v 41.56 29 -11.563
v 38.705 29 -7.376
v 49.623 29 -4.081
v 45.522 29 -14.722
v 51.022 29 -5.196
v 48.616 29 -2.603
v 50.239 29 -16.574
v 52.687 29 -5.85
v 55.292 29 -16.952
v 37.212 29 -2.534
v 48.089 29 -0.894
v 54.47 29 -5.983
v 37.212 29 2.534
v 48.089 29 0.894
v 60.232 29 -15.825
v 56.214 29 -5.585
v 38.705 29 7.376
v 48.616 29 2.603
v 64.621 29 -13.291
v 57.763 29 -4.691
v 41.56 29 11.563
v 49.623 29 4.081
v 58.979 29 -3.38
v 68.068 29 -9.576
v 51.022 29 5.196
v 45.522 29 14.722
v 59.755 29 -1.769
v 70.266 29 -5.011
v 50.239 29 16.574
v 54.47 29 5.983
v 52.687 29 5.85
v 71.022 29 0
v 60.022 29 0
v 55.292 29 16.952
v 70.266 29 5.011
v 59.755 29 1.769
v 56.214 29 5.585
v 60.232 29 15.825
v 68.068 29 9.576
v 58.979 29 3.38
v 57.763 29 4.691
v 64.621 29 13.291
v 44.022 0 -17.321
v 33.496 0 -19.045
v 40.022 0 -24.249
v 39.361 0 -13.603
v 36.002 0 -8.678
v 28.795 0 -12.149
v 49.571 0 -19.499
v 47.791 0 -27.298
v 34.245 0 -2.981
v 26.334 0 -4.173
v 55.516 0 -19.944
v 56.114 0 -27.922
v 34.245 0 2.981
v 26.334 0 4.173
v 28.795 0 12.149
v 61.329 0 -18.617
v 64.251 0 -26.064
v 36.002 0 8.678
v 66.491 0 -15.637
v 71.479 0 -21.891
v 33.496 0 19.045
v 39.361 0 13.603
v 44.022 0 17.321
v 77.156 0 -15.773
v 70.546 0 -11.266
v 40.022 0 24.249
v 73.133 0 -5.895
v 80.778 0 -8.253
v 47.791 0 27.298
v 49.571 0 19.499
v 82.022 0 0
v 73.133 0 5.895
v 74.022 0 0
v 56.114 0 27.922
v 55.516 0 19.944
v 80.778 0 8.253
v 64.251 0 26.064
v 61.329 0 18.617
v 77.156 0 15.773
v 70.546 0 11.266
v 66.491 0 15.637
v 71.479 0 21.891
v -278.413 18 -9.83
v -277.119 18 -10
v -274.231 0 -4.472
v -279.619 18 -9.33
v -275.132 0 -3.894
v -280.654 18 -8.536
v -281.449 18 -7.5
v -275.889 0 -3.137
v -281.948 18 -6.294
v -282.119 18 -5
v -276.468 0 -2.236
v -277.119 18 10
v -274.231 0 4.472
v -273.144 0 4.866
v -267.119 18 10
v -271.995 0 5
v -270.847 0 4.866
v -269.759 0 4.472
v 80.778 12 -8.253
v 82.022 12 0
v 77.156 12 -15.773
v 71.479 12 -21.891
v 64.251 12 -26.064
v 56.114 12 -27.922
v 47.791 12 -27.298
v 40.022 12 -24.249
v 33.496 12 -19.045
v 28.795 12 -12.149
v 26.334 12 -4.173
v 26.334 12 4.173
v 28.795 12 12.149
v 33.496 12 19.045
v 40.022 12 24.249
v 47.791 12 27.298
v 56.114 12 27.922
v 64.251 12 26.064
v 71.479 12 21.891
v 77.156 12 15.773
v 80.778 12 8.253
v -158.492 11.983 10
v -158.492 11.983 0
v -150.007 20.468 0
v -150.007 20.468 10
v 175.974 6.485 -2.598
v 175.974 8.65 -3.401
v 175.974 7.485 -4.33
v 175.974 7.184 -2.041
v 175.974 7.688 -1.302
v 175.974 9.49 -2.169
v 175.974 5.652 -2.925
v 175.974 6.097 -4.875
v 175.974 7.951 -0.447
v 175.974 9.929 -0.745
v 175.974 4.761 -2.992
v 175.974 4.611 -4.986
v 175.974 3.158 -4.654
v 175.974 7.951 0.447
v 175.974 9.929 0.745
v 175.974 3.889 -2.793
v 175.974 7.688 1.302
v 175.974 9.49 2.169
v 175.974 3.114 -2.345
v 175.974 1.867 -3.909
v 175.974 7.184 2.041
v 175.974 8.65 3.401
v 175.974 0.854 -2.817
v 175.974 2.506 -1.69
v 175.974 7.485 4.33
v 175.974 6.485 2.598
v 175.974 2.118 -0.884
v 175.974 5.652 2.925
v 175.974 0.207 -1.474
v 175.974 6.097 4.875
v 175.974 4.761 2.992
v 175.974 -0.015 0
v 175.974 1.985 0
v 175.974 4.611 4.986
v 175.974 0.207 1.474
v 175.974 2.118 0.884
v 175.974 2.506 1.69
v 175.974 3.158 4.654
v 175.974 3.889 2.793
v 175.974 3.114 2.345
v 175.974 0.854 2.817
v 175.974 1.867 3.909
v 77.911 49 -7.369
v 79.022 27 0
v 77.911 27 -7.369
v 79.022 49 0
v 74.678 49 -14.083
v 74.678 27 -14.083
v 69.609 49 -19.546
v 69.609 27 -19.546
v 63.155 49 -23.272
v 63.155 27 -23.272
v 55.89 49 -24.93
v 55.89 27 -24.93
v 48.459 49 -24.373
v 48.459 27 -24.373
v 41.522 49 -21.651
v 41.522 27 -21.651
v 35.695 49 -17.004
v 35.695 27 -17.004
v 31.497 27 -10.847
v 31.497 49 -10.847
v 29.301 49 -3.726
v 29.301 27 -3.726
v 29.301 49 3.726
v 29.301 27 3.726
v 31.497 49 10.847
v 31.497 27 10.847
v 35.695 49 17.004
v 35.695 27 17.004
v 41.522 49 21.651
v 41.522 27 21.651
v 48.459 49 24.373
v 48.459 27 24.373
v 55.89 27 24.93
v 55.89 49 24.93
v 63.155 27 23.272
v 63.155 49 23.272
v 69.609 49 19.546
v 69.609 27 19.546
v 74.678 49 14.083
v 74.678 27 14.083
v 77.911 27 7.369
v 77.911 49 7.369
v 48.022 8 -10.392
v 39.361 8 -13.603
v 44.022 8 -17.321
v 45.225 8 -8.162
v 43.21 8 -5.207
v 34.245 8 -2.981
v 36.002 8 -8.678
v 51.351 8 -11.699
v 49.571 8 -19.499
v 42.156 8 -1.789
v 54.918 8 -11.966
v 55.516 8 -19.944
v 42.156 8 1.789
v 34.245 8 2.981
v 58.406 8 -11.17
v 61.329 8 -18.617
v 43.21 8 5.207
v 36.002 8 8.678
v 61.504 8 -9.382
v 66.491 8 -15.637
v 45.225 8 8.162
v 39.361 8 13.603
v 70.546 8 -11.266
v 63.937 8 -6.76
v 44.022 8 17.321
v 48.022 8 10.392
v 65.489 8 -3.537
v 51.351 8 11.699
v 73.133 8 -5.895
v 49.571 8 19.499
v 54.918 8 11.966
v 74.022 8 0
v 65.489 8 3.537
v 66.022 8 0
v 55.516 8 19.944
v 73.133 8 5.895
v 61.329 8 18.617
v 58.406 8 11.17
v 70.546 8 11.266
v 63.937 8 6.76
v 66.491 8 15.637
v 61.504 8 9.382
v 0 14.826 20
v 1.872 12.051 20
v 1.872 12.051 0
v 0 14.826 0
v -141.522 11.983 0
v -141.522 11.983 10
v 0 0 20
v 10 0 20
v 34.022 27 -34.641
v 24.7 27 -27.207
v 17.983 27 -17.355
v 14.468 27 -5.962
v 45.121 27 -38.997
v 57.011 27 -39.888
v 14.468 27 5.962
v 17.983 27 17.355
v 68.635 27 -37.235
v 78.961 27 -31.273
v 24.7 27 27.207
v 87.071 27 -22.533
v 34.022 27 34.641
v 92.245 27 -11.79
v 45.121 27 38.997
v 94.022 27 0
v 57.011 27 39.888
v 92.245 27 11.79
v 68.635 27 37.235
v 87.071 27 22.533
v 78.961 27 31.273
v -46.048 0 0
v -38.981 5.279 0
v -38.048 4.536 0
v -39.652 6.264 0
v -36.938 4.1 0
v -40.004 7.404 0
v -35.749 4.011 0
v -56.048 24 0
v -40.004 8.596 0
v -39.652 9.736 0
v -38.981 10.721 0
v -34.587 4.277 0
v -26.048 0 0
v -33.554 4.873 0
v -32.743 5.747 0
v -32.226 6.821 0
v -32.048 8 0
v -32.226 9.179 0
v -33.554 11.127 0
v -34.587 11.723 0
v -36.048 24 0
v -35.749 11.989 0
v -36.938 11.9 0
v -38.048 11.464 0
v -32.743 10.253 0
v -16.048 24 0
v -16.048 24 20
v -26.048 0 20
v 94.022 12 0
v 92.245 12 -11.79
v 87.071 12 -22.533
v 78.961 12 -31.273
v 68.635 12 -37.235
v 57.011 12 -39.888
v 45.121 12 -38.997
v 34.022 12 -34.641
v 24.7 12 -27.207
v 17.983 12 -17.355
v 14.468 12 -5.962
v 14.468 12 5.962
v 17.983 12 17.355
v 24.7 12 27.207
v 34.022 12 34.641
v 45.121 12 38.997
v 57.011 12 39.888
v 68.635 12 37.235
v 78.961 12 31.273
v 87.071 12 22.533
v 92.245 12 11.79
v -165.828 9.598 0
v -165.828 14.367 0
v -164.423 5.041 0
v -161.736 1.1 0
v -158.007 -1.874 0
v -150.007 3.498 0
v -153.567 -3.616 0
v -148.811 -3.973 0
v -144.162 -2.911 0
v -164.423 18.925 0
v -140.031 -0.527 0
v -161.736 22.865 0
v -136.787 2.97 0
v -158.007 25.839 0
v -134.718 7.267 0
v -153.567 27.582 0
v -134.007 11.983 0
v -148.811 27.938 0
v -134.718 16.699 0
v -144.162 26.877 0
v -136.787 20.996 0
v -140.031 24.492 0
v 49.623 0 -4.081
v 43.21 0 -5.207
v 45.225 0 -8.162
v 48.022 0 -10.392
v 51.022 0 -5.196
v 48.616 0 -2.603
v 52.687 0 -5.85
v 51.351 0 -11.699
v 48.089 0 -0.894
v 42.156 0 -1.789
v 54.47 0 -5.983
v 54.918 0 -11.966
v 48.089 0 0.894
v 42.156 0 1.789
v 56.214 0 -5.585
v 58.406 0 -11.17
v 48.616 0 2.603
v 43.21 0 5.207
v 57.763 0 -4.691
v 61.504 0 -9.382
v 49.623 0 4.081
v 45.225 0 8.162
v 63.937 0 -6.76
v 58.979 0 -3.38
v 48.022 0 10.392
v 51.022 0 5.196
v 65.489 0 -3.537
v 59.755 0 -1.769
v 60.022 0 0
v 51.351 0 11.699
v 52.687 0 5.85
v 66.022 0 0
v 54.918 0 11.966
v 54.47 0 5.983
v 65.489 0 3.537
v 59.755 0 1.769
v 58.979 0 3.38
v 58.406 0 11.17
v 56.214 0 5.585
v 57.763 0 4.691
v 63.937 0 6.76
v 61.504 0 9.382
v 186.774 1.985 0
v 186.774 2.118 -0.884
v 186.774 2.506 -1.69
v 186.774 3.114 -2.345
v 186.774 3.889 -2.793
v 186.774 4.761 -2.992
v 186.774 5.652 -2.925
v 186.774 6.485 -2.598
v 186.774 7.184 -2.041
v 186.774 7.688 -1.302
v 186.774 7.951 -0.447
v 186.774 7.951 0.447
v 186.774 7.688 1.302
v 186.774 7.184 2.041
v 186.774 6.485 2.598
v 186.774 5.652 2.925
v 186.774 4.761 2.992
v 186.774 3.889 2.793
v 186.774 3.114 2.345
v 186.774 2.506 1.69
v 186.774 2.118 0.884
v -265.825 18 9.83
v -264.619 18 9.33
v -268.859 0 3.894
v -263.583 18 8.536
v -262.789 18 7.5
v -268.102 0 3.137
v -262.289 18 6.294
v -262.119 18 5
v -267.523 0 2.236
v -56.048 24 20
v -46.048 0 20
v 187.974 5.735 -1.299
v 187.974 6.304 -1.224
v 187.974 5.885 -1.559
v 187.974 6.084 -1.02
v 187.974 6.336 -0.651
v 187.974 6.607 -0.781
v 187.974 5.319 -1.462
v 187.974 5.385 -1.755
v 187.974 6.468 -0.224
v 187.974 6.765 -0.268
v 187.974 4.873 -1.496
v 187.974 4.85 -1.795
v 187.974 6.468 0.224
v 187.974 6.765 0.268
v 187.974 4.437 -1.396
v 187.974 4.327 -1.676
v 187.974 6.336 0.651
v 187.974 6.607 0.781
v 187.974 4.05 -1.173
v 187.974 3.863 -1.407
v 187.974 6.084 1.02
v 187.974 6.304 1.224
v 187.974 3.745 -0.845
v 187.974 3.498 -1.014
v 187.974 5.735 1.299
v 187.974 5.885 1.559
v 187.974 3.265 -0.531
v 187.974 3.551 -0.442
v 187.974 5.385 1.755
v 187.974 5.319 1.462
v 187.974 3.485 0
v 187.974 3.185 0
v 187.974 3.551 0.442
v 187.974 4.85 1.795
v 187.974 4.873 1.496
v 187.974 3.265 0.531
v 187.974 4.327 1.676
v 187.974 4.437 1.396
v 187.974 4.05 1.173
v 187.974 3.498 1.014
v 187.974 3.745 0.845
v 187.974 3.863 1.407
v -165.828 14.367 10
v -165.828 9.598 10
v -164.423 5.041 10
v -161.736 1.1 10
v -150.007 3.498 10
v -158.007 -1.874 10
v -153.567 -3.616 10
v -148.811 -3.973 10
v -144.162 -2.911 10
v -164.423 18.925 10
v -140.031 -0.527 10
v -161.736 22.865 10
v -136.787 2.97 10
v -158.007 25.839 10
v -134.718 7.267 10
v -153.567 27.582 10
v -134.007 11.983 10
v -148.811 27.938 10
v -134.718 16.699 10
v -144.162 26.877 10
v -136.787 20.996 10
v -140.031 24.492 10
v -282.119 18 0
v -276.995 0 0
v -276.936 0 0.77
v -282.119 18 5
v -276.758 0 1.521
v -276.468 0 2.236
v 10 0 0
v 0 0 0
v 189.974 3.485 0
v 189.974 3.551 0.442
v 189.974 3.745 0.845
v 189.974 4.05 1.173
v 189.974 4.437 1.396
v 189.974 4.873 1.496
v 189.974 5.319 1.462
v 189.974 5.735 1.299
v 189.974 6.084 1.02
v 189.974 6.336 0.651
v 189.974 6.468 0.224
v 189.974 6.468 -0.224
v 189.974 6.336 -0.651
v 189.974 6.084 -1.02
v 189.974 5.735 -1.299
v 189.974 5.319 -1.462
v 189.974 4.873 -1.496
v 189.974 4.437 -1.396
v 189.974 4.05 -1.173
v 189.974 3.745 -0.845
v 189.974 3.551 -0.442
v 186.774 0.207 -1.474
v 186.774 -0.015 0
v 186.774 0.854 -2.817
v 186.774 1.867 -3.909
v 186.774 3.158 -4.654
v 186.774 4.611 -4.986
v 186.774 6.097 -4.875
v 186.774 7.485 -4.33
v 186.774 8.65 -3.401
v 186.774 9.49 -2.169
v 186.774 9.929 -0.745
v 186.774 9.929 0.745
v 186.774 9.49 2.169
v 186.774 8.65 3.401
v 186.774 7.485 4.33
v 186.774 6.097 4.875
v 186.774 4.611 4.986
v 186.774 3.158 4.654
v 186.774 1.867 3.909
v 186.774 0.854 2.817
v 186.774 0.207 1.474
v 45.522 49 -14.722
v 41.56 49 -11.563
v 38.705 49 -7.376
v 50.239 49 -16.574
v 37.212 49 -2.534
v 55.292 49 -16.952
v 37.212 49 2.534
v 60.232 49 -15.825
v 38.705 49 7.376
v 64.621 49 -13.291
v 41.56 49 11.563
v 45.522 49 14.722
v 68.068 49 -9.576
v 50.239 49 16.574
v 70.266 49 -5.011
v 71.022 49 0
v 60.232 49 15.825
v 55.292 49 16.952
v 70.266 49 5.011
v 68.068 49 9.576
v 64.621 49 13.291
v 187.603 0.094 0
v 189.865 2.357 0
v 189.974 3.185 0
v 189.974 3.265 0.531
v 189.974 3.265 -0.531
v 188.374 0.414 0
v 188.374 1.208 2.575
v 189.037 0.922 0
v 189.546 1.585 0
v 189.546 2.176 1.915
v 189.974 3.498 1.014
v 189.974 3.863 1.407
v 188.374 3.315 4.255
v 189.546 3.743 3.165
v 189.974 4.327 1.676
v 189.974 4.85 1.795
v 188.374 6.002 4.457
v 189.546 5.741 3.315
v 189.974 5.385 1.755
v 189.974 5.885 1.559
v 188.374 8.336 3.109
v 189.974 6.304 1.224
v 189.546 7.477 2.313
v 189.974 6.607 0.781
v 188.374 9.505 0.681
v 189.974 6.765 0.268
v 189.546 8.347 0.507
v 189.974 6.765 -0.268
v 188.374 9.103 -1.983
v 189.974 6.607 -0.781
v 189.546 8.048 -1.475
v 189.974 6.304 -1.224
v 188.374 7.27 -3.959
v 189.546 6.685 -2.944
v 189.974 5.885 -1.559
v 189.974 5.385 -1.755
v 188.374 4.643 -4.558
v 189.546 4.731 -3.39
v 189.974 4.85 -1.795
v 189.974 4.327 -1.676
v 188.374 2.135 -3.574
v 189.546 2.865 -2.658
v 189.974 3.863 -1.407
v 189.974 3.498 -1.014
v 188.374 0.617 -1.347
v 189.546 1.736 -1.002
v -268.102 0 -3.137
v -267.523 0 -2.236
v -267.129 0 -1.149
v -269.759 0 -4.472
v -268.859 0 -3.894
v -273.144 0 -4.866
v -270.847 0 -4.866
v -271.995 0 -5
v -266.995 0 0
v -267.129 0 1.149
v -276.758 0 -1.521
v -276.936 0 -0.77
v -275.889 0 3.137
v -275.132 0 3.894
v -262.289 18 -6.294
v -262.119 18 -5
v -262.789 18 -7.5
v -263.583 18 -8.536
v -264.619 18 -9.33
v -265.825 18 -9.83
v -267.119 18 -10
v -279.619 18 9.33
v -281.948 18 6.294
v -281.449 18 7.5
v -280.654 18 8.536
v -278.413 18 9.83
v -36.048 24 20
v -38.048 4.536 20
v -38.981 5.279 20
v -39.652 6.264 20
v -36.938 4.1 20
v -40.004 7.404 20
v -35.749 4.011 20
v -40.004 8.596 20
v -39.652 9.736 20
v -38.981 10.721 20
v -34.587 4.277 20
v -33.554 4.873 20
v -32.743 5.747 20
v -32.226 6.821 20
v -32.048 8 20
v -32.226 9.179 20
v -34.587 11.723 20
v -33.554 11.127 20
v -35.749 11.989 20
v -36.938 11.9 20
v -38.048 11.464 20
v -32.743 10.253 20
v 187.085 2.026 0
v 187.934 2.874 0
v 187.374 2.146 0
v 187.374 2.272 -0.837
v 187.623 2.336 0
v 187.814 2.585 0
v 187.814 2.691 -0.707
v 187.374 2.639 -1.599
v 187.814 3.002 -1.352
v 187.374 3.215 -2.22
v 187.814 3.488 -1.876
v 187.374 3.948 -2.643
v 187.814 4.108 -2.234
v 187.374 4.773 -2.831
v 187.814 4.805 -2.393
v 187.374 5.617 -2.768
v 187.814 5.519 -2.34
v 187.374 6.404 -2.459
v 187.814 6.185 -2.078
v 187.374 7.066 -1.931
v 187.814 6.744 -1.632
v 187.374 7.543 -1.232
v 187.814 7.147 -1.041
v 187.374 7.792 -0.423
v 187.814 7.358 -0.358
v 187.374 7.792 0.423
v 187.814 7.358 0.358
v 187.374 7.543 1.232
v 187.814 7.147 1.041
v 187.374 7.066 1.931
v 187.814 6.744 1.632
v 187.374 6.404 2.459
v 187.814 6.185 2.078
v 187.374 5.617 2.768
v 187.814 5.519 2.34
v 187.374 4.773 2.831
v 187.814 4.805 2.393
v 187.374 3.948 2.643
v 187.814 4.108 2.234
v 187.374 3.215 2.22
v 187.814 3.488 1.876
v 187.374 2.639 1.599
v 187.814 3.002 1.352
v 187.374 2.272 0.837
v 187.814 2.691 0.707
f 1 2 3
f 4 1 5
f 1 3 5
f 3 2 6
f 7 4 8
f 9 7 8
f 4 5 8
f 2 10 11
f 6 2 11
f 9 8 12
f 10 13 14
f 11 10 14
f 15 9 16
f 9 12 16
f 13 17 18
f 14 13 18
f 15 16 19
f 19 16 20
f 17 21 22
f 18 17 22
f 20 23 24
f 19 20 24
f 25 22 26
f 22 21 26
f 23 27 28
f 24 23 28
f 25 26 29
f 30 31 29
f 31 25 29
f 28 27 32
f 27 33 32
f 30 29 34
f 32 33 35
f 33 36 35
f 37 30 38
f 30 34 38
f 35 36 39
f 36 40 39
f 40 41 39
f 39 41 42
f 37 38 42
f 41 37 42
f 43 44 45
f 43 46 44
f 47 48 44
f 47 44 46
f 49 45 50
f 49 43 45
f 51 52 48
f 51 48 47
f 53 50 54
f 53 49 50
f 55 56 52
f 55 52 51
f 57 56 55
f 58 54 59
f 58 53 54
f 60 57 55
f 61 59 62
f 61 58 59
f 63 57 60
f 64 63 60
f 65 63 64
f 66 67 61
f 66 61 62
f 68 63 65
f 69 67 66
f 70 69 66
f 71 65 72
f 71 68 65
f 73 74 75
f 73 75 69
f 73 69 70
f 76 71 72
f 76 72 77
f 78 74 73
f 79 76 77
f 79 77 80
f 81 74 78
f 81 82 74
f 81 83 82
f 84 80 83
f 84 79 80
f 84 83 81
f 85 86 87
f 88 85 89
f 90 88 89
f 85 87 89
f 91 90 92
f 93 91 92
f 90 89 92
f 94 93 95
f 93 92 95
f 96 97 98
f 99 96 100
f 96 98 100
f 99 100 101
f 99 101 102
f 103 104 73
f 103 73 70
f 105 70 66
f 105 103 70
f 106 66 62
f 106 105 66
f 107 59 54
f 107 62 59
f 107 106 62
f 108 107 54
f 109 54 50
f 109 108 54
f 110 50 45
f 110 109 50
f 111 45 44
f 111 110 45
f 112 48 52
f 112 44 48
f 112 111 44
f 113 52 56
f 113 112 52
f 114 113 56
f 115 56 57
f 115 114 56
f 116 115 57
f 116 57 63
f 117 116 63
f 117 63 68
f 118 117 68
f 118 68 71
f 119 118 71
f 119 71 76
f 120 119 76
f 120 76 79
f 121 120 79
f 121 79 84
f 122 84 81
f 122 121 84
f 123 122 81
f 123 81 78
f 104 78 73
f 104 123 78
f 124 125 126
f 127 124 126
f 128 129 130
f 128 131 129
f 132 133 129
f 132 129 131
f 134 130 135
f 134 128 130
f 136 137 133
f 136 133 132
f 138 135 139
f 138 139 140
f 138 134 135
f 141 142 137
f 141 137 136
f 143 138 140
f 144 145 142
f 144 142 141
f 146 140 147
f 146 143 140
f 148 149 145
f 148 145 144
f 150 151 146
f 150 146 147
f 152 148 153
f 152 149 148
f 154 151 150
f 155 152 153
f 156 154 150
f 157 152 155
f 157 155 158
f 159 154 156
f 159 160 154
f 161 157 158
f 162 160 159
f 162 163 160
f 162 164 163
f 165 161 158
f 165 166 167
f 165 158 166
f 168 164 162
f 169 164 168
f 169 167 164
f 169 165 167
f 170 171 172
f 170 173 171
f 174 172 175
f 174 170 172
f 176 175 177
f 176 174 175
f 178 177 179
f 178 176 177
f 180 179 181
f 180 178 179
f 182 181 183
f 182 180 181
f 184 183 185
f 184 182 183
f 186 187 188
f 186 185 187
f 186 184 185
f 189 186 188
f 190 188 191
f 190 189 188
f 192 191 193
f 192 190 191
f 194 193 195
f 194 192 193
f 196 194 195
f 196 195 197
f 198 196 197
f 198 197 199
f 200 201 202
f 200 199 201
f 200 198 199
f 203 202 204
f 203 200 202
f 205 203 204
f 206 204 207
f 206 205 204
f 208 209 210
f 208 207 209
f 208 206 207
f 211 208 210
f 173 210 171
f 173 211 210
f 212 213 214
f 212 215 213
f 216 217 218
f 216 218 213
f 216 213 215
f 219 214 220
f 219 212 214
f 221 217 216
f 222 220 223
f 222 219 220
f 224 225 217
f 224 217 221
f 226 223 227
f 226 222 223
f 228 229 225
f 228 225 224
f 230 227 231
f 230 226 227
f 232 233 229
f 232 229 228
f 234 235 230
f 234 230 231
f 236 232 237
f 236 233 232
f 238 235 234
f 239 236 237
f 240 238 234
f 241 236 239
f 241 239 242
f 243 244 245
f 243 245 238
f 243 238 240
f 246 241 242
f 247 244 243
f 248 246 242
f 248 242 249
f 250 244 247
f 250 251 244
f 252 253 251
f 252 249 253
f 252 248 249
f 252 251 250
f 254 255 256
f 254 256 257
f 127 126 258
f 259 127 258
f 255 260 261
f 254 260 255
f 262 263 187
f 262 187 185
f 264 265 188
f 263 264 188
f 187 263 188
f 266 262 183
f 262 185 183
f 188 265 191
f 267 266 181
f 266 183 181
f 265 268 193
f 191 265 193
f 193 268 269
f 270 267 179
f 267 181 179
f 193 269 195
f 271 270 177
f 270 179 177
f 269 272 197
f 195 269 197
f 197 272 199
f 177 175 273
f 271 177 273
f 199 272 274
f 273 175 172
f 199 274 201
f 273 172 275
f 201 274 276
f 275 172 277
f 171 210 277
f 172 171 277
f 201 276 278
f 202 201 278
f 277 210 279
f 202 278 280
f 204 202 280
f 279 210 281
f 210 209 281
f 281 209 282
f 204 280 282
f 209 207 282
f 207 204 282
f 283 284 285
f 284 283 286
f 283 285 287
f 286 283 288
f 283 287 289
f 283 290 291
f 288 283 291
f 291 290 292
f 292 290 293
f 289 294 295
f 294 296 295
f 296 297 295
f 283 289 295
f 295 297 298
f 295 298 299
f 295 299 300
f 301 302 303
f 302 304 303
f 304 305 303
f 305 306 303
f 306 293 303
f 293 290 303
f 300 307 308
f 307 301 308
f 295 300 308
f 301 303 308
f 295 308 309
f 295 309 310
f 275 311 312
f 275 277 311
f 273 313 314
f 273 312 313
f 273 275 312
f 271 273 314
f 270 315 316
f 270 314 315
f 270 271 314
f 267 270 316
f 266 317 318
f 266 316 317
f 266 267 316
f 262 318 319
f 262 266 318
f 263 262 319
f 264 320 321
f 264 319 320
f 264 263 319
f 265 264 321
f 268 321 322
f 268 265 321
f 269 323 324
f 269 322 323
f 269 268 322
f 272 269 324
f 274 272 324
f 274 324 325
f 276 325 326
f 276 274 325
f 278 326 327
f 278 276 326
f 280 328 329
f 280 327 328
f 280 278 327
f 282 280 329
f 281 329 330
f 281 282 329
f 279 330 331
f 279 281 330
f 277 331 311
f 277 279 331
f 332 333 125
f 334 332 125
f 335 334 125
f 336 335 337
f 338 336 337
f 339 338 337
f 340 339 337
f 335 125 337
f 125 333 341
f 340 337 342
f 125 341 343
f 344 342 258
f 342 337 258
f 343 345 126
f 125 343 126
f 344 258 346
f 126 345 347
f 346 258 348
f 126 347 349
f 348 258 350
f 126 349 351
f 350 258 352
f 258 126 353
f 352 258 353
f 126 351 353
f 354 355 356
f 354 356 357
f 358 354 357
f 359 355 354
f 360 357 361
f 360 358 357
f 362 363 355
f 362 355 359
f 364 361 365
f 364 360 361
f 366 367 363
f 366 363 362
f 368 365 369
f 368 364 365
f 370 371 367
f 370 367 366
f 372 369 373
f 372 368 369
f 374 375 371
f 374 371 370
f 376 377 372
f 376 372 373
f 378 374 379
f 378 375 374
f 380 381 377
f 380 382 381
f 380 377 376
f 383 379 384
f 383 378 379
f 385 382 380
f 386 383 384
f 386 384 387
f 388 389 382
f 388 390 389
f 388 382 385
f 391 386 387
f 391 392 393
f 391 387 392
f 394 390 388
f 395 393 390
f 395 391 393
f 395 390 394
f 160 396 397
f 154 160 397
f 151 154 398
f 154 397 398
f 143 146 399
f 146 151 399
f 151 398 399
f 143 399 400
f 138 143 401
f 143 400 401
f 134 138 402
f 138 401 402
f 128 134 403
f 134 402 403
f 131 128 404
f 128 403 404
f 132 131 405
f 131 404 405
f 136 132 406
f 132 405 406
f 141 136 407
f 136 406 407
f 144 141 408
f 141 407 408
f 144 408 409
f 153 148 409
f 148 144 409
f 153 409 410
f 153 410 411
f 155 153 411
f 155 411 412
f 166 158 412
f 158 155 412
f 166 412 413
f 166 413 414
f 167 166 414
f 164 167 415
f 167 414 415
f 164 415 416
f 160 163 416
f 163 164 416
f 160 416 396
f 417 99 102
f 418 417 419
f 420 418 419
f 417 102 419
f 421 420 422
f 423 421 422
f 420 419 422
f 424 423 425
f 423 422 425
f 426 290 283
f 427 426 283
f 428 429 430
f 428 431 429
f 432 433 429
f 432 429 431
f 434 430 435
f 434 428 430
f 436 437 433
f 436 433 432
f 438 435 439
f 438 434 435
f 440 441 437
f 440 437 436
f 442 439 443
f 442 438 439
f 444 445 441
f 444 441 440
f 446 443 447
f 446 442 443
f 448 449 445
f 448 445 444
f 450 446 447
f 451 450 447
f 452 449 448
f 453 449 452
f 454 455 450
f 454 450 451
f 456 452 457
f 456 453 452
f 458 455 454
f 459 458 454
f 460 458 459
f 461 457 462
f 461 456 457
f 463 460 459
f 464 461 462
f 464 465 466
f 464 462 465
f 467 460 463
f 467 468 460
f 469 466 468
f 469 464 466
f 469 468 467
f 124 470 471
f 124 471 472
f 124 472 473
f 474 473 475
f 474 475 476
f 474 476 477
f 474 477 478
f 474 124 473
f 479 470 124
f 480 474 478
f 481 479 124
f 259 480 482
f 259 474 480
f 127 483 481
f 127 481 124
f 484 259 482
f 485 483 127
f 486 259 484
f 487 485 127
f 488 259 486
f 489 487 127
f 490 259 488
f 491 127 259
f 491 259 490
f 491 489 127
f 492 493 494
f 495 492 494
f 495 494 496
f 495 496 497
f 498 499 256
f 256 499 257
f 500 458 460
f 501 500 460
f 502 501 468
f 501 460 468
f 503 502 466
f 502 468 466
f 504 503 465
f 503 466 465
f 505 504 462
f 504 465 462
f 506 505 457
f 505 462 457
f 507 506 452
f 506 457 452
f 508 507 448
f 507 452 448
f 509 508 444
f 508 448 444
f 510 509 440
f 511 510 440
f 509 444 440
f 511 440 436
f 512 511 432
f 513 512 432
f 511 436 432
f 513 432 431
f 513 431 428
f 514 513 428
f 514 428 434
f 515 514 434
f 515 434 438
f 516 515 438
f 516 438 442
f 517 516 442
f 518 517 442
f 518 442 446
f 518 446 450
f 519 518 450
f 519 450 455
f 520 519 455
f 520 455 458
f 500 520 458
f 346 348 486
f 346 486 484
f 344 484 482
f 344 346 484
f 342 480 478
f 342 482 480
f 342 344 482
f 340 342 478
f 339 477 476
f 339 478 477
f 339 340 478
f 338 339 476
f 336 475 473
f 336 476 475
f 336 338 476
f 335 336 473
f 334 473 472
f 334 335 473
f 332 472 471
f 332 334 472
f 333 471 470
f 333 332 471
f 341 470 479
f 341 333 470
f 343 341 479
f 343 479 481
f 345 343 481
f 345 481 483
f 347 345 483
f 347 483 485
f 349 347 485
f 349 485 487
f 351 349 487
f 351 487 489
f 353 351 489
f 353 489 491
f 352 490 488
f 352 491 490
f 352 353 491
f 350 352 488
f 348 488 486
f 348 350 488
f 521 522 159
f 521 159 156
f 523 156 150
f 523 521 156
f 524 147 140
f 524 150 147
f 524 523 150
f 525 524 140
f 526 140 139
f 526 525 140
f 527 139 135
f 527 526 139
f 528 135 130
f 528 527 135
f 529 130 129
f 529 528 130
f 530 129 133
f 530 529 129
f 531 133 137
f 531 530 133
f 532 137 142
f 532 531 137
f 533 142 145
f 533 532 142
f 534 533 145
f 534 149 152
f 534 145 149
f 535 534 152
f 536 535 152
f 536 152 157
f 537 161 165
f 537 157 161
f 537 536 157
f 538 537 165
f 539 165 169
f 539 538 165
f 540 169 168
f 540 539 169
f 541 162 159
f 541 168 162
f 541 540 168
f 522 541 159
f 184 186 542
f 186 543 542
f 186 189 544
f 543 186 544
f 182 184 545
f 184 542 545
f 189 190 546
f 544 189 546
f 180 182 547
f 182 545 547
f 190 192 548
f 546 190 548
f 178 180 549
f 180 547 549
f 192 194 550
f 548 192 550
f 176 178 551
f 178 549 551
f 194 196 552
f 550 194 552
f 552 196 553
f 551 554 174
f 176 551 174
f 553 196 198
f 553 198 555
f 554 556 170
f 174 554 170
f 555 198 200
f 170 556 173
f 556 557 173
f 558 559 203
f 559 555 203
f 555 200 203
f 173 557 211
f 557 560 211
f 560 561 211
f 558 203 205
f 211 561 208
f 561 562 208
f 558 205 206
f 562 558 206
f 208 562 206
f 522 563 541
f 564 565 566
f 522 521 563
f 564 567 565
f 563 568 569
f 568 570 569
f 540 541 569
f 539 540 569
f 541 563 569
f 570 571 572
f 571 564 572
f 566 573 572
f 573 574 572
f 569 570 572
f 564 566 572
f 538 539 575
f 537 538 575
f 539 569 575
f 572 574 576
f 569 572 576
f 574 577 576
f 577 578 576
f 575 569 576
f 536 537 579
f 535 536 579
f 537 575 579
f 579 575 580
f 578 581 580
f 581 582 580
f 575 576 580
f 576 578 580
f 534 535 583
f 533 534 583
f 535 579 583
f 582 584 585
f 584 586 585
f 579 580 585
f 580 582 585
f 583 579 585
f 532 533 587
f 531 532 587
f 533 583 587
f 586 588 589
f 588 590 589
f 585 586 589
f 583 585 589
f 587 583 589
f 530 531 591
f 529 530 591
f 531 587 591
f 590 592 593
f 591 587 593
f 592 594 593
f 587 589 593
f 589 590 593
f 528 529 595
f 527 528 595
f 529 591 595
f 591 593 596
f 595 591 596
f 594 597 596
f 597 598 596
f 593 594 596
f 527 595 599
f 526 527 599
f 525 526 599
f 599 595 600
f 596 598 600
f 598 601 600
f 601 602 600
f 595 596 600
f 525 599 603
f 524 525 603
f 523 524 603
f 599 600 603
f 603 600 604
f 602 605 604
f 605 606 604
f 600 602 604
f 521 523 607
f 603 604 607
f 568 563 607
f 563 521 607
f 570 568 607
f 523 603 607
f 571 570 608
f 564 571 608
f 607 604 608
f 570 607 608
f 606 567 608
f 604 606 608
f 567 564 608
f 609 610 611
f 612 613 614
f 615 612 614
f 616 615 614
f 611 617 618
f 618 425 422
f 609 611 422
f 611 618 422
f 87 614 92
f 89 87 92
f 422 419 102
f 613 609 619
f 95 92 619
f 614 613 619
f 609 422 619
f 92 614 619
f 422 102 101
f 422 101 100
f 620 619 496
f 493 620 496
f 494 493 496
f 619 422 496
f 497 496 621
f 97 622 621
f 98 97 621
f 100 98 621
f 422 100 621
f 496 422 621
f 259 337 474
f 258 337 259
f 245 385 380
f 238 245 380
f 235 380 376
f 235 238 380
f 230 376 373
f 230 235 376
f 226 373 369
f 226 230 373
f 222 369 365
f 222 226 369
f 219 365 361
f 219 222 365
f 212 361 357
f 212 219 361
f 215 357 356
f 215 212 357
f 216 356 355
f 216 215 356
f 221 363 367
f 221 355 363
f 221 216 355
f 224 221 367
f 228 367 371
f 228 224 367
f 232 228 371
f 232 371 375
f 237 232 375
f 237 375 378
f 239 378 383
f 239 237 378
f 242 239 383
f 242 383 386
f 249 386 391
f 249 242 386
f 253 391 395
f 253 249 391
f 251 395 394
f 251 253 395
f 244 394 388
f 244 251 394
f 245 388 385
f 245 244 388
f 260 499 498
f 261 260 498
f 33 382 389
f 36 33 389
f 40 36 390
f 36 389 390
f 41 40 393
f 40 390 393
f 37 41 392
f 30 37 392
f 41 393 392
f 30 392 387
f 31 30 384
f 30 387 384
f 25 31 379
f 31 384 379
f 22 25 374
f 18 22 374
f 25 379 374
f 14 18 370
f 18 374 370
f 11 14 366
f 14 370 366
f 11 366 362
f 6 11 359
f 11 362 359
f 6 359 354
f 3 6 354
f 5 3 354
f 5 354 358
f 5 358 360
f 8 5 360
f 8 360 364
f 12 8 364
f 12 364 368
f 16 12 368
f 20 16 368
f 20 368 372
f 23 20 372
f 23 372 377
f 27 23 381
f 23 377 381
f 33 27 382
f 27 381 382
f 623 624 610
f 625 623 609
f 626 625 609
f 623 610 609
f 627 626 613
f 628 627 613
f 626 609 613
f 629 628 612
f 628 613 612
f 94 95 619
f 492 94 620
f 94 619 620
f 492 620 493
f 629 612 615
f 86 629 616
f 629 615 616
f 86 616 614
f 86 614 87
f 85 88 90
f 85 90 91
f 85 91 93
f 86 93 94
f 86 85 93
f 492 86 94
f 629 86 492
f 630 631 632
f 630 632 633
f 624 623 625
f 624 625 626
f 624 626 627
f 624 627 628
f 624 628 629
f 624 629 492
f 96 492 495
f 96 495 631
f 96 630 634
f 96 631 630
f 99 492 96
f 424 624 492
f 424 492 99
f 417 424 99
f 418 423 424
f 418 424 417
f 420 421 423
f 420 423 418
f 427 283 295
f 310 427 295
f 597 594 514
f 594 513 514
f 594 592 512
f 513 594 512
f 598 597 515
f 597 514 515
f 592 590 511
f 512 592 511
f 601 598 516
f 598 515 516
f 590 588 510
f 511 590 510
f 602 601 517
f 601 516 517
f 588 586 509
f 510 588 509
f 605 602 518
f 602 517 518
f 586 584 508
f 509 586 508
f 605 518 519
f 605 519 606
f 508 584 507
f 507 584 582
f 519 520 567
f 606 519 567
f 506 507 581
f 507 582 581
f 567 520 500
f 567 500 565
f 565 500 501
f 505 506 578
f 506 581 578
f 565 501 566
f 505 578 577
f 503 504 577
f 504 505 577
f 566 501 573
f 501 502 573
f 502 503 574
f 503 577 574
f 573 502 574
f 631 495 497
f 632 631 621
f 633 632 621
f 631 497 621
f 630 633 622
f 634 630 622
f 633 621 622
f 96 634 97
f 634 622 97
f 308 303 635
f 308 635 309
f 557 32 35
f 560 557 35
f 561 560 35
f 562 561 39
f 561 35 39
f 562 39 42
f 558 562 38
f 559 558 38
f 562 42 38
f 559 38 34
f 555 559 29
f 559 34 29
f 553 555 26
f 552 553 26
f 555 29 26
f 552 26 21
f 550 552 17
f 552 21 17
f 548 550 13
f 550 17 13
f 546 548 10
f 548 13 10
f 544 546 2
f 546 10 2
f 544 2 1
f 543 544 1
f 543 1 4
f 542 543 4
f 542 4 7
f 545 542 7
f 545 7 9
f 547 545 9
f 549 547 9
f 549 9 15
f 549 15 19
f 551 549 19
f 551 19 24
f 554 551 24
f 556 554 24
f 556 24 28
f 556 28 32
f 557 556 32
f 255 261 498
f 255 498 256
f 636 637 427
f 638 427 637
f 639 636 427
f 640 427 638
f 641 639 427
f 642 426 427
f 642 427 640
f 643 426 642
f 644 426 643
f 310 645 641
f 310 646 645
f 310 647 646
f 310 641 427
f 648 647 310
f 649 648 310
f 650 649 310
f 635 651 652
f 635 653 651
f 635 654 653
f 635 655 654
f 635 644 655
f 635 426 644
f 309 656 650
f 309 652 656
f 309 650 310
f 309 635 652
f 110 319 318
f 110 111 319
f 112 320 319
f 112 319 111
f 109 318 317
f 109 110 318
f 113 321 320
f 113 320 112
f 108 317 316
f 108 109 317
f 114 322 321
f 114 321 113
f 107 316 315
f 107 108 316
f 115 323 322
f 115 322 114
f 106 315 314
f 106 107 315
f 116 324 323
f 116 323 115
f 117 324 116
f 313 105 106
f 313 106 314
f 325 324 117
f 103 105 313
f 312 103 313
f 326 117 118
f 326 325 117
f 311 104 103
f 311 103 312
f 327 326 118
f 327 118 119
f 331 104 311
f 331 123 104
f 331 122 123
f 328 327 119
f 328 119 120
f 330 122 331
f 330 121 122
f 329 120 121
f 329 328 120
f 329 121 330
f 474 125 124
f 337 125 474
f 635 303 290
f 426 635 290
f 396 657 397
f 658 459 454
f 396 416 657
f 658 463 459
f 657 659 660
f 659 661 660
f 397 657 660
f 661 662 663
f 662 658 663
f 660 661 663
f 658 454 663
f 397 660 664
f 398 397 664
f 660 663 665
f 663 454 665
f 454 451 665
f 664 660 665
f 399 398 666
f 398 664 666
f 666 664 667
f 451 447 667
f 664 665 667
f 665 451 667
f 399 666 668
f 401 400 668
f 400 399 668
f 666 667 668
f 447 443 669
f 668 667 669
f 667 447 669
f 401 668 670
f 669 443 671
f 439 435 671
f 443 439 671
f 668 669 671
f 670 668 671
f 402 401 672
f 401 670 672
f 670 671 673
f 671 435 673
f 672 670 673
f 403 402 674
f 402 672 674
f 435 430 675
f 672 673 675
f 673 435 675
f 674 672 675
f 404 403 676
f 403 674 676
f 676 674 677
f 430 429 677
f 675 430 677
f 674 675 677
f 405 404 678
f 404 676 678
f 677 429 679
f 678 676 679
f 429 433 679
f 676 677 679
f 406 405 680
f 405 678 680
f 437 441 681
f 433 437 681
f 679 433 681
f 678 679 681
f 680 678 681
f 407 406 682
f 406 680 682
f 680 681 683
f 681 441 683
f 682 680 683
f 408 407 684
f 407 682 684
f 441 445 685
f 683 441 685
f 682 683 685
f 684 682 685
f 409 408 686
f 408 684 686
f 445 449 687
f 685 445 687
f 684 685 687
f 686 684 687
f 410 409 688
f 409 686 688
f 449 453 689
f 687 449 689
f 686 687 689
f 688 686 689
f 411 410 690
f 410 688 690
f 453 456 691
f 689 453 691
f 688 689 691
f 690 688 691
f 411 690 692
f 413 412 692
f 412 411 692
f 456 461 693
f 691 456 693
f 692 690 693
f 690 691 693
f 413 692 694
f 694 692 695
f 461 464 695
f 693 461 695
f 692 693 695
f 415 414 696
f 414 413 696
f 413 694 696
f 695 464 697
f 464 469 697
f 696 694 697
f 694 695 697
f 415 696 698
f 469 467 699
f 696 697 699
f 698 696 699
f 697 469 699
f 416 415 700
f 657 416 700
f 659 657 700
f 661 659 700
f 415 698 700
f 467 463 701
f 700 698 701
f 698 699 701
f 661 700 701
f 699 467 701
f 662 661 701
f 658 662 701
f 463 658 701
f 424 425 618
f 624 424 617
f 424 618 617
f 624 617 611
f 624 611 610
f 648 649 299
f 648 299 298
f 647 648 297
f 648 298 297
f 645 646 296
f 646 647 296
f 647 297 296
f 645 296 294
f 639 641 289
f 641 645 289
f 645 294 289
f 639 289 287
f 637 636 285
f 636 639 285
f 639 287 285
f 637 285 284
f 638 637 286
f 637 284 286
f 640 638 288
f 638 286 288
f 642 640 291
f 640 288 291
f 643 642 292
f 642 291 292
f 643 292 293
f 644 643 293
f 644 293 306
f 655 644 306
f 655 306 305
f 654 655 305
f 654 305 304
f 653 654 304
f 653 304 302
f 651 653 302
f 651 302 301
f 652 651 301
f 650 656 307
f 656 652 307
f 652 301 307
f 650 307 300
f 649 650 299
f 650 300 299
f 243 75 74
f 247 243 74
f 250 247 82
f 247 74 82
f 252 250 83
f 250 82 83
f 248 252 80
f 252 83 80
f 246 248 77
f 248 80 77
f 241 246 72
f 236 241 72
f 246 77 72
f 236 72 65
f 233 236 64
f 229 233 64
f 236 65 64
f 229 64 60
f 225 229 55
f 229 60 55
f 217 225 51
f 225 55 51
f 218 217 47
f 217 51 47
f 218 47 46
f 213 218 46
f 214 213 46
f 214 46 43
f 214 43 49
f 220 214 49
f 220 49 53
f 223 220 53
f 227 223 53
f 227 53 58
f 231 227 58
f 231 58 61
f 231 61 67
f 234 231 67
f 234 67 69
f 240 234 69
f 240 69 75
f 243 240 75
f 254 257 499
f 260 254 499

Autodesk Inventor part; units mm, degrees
ref_plane "YZ Plane" through (0, 0, 0) normal (1, 0, 0) x (0, 1, 0)
ref_plane "XY Plane" through (0, 0, 0) normal (0, 0, 1) x (1, 0, 0)
sketch "Эскиз3" plane through (0, 0, 0) normal (0, 0, 1) x (1, 0, 0)
  line L0 (0, 0) -> (10, 0)
  line L1 (10, 0) -> (1.8715, 12.051)
  line L2 (1.8715, 12.051) -> (0, 14.8256)
  line L3 (0, 14.8256) -> (0, 0)
  dimension "d0" = 10
  dimension "d1" = 56
sketch "Эскиз4" plane through (0, 0, 0) normal (0, 0, 1) x (1, 0, 0)
  line L0 (-46.0484, 0) -> (-26.0484, 0)
  line L1 (-16.0484, 24) -> (-26.0484, 0)
  line L2 (-56.0484, 24) -> (-46.0484, 0)
  circle A0 centre (-36.0484, 8) radius 4
  line L3 (-36.0484, 24) -> (-56.0484, 24)
  line L4 (-36.0484, 24) -> (-16.0484, 24)
  point P0 (0, 0)
  dimension "d2" = 20
  dimension "d8" = 8
  dimension "d10" = 20
  dimension "d11" = 20
  dimension "d12" = 16
sketch "Эскиз5" plane through (0, 0, 0) normal (0, 0, 1) x (1, 0, 0)
  line L0 (60.0217, 0) -> (66.0217, 0)
  line L1 (66.0217, 0) -> (66.0217, 8)
  line L2 (66.0217, 8) -> (74.0217, 8)
  line L3 (74.0217, 8) -> (74.0217, 0)
  line L4 (74.0217, 0) -> (82.0217, 0)
  line L5 (82.0217, 0) -> (82.0217, 12)
  line L6 (82.0217, 12) -> (94.0217, 12)
  line L7 (94.0217, 12) -> (94.0217, 27)
  line L8 (94.0217, 27) -> (79.0217, 27)
  line L9 (79.0217, 27) -> (79.0217, 49)
  line L10 (79.0217, 49) -> (71.0217, 49)
  line L11 (71.0217, 49) -> (71.0217, 29)
  line L12 (71.0217, 29) -> (60.0217, 29)
  line L13 (60.0217, 29) -> (60.0217, 0)
  line L14 (60.0217, 0) -> (54.0217, 0)
  line L15 (54.0217, 15.2415) -> (54.0217, -9.2055)
  point P0 (0, 0)
  dimension "d13" = 6
  dimension "d14" = 8
  dimension "d15" = 8
  dimension "d16" = 8
  dimension "d17" = 8
  dimension "d18" = 12
  dimension "d19" = 12
  dimension "d20" = 15
  dimension "d21" = 15
  dimension "d22" = 22
  dimension "d23" = 8
  dimension "d24" = 20
  dimension "d25" = 11
  dimension "d76" = 6
sketch "Эскиз6" plane through (0, 0, 0) normal (0, 0, 1) x (1, 0, 0)
  circle A0 centre (-150.007, 11.9827) radius 16
  line L0 (-150.007, 20.468) -> (-141.5218, 11.9827)
  line L1 (-158.4923, 11.9827) -> (-150.007, 3.4975)
  line L2 (-150.007, 3.4975) -> (-141.5218, 11.9827)
  line L3 (-141.5218, 11.9827) -> (-150.007, 3.4975)
  line L4 (-158.4923, 11.9827) -> (-150.007, 20.468)
  point P0 (0, 0)
sketch "Эскиз7" plane through (0, 0, 0) normal (0, 0, 1) x (1, 0, 0)
  point P0 (0, 0)
sketch "Эскиз8" plane through (0, 0, 0) normal (0, 0, 1) x (1, 0, 0)
  line L0 (175.9744, 1.9848) -> (175.9744, -0.0152)
  line L1 (175.9744, -0.0152) -> (186.7744, -0.0152)
  line L2 (175.9744, 1.9848) -> (186.7744, 1.9848)
  line L3 (186.7744, 1.9848) -> (186.7744, 1.9848)
  line L4 (187.9744, 3.1848) -> (187.9744, 3.1848)
  line L5 (189.9744, 3.1848) -> (189.9744, 3.1848)
  line L6 (186.7744, -0.0152) -> (186.7744, -0.0152)
  line L7 (186.7744, -0.0152) -> (186.7744, -0.0152)
  line L8 (189.9744, 3.1848) -> (189.9744, 3.4848)
  line L9 (189.9744, 3.4848) -> (187.9744, 3.4848)
  line L10 (187.9744, 3.4848) -> (187.9744, 3.1848)
  line L11 (186.7744, 1.9848) -> (186.7744, 1.9848)
  arc A0 (186.7744, -0.0152) -> (189.9744, 3.1848) centre (186.7744, 3.1848) ccw
  arc A1 (186.7744, 1.9848) -> (187.9744, 3.1848) centre (186.7744, 3.1848) ccw
  line L12 (179.9977, 4.9848) -> (177.4727, 4.9848)
  point P0 (0, 0)
  point P1 (189.9744, -0.0152)
  dimension "d38" = 2
  dimension "d58" = 14
  dimension "d63" = 3.5
  dimension "d64" = 2
  dimension "d67" = 1.2
  dimension "d68" = 3.2
  dimension "d71" = 5
extrude "Выдавливание1" add sketch "Эскиз3" along normal blind 20
extrude "Выдавливание2" add sketch "Эскиз6" along normal blind 10
revolve "Вращение1" add sketch "Эскиз5" angle 360 about axis through (54.0217, 15.2415, 0) along (0, -1, 0)
extrude "Выдавливание3" add sketch "Эскиз4" along normal blind 20
revolve "Вращение2" add sketch "Эскиз8" angle 360 about axis through (179.9977, 4.9848, 0) along (-1, 0, 0)
sketch "Эскиз9" plane through (0, 0, 0) normal (0, 1, 0) x (-1, 0, 0)
  circle A0 centre (271.9954, 0) radius 5
  point P0 (0, 0)
ref_plane "РабПлоскость1" through (0, 18, 0) normal (0, 1, 0) x (-1, 0, 0)
sketch "Эскиз10" plane through (0, 18, 0) normal (0, 1, 0) x (-1, 0, 0)
  line L0 (267.1187, 10) -> (277.1187, 10)
  line L1 (282.1187, 5) -> (282.1187, -5)
  line L2 (277.1187, -10) -> (267.1187, -10)
  line L3 (262.1187, -5) -> (262.1187, 5)
  arc A0 (277.1187, -10) -> (282.1187, -5) centre (277.1187, -5) ccw
  arc A1 (262.1187, -5) -> (267.1187, -10) centre (267.1187, -5) ccw
  arc A2 (267.1187, 10) -> (262.1187, 5) centre (267.1187, 5) ccw
  arc A3 (282.1187, 5) -> (277.1187, 10) centre (277.1187, 5) ccw
  point P0 (0, 0)
  dimension "d88" = 5
loft "Лофт1" add profiles "Эскиз10", "Эскиз9"
sketch "Эскиз11" plane through (0, 0, 0) normal (0, 0, 1) x (1, 0, 0)
  circle A0 centre (-199.5369, 79.7312) radius 9
  circle A1 centre (-139.5369, 79.7312) radius 9
  point P0 (0, 0)
properties part number "Lab1"
